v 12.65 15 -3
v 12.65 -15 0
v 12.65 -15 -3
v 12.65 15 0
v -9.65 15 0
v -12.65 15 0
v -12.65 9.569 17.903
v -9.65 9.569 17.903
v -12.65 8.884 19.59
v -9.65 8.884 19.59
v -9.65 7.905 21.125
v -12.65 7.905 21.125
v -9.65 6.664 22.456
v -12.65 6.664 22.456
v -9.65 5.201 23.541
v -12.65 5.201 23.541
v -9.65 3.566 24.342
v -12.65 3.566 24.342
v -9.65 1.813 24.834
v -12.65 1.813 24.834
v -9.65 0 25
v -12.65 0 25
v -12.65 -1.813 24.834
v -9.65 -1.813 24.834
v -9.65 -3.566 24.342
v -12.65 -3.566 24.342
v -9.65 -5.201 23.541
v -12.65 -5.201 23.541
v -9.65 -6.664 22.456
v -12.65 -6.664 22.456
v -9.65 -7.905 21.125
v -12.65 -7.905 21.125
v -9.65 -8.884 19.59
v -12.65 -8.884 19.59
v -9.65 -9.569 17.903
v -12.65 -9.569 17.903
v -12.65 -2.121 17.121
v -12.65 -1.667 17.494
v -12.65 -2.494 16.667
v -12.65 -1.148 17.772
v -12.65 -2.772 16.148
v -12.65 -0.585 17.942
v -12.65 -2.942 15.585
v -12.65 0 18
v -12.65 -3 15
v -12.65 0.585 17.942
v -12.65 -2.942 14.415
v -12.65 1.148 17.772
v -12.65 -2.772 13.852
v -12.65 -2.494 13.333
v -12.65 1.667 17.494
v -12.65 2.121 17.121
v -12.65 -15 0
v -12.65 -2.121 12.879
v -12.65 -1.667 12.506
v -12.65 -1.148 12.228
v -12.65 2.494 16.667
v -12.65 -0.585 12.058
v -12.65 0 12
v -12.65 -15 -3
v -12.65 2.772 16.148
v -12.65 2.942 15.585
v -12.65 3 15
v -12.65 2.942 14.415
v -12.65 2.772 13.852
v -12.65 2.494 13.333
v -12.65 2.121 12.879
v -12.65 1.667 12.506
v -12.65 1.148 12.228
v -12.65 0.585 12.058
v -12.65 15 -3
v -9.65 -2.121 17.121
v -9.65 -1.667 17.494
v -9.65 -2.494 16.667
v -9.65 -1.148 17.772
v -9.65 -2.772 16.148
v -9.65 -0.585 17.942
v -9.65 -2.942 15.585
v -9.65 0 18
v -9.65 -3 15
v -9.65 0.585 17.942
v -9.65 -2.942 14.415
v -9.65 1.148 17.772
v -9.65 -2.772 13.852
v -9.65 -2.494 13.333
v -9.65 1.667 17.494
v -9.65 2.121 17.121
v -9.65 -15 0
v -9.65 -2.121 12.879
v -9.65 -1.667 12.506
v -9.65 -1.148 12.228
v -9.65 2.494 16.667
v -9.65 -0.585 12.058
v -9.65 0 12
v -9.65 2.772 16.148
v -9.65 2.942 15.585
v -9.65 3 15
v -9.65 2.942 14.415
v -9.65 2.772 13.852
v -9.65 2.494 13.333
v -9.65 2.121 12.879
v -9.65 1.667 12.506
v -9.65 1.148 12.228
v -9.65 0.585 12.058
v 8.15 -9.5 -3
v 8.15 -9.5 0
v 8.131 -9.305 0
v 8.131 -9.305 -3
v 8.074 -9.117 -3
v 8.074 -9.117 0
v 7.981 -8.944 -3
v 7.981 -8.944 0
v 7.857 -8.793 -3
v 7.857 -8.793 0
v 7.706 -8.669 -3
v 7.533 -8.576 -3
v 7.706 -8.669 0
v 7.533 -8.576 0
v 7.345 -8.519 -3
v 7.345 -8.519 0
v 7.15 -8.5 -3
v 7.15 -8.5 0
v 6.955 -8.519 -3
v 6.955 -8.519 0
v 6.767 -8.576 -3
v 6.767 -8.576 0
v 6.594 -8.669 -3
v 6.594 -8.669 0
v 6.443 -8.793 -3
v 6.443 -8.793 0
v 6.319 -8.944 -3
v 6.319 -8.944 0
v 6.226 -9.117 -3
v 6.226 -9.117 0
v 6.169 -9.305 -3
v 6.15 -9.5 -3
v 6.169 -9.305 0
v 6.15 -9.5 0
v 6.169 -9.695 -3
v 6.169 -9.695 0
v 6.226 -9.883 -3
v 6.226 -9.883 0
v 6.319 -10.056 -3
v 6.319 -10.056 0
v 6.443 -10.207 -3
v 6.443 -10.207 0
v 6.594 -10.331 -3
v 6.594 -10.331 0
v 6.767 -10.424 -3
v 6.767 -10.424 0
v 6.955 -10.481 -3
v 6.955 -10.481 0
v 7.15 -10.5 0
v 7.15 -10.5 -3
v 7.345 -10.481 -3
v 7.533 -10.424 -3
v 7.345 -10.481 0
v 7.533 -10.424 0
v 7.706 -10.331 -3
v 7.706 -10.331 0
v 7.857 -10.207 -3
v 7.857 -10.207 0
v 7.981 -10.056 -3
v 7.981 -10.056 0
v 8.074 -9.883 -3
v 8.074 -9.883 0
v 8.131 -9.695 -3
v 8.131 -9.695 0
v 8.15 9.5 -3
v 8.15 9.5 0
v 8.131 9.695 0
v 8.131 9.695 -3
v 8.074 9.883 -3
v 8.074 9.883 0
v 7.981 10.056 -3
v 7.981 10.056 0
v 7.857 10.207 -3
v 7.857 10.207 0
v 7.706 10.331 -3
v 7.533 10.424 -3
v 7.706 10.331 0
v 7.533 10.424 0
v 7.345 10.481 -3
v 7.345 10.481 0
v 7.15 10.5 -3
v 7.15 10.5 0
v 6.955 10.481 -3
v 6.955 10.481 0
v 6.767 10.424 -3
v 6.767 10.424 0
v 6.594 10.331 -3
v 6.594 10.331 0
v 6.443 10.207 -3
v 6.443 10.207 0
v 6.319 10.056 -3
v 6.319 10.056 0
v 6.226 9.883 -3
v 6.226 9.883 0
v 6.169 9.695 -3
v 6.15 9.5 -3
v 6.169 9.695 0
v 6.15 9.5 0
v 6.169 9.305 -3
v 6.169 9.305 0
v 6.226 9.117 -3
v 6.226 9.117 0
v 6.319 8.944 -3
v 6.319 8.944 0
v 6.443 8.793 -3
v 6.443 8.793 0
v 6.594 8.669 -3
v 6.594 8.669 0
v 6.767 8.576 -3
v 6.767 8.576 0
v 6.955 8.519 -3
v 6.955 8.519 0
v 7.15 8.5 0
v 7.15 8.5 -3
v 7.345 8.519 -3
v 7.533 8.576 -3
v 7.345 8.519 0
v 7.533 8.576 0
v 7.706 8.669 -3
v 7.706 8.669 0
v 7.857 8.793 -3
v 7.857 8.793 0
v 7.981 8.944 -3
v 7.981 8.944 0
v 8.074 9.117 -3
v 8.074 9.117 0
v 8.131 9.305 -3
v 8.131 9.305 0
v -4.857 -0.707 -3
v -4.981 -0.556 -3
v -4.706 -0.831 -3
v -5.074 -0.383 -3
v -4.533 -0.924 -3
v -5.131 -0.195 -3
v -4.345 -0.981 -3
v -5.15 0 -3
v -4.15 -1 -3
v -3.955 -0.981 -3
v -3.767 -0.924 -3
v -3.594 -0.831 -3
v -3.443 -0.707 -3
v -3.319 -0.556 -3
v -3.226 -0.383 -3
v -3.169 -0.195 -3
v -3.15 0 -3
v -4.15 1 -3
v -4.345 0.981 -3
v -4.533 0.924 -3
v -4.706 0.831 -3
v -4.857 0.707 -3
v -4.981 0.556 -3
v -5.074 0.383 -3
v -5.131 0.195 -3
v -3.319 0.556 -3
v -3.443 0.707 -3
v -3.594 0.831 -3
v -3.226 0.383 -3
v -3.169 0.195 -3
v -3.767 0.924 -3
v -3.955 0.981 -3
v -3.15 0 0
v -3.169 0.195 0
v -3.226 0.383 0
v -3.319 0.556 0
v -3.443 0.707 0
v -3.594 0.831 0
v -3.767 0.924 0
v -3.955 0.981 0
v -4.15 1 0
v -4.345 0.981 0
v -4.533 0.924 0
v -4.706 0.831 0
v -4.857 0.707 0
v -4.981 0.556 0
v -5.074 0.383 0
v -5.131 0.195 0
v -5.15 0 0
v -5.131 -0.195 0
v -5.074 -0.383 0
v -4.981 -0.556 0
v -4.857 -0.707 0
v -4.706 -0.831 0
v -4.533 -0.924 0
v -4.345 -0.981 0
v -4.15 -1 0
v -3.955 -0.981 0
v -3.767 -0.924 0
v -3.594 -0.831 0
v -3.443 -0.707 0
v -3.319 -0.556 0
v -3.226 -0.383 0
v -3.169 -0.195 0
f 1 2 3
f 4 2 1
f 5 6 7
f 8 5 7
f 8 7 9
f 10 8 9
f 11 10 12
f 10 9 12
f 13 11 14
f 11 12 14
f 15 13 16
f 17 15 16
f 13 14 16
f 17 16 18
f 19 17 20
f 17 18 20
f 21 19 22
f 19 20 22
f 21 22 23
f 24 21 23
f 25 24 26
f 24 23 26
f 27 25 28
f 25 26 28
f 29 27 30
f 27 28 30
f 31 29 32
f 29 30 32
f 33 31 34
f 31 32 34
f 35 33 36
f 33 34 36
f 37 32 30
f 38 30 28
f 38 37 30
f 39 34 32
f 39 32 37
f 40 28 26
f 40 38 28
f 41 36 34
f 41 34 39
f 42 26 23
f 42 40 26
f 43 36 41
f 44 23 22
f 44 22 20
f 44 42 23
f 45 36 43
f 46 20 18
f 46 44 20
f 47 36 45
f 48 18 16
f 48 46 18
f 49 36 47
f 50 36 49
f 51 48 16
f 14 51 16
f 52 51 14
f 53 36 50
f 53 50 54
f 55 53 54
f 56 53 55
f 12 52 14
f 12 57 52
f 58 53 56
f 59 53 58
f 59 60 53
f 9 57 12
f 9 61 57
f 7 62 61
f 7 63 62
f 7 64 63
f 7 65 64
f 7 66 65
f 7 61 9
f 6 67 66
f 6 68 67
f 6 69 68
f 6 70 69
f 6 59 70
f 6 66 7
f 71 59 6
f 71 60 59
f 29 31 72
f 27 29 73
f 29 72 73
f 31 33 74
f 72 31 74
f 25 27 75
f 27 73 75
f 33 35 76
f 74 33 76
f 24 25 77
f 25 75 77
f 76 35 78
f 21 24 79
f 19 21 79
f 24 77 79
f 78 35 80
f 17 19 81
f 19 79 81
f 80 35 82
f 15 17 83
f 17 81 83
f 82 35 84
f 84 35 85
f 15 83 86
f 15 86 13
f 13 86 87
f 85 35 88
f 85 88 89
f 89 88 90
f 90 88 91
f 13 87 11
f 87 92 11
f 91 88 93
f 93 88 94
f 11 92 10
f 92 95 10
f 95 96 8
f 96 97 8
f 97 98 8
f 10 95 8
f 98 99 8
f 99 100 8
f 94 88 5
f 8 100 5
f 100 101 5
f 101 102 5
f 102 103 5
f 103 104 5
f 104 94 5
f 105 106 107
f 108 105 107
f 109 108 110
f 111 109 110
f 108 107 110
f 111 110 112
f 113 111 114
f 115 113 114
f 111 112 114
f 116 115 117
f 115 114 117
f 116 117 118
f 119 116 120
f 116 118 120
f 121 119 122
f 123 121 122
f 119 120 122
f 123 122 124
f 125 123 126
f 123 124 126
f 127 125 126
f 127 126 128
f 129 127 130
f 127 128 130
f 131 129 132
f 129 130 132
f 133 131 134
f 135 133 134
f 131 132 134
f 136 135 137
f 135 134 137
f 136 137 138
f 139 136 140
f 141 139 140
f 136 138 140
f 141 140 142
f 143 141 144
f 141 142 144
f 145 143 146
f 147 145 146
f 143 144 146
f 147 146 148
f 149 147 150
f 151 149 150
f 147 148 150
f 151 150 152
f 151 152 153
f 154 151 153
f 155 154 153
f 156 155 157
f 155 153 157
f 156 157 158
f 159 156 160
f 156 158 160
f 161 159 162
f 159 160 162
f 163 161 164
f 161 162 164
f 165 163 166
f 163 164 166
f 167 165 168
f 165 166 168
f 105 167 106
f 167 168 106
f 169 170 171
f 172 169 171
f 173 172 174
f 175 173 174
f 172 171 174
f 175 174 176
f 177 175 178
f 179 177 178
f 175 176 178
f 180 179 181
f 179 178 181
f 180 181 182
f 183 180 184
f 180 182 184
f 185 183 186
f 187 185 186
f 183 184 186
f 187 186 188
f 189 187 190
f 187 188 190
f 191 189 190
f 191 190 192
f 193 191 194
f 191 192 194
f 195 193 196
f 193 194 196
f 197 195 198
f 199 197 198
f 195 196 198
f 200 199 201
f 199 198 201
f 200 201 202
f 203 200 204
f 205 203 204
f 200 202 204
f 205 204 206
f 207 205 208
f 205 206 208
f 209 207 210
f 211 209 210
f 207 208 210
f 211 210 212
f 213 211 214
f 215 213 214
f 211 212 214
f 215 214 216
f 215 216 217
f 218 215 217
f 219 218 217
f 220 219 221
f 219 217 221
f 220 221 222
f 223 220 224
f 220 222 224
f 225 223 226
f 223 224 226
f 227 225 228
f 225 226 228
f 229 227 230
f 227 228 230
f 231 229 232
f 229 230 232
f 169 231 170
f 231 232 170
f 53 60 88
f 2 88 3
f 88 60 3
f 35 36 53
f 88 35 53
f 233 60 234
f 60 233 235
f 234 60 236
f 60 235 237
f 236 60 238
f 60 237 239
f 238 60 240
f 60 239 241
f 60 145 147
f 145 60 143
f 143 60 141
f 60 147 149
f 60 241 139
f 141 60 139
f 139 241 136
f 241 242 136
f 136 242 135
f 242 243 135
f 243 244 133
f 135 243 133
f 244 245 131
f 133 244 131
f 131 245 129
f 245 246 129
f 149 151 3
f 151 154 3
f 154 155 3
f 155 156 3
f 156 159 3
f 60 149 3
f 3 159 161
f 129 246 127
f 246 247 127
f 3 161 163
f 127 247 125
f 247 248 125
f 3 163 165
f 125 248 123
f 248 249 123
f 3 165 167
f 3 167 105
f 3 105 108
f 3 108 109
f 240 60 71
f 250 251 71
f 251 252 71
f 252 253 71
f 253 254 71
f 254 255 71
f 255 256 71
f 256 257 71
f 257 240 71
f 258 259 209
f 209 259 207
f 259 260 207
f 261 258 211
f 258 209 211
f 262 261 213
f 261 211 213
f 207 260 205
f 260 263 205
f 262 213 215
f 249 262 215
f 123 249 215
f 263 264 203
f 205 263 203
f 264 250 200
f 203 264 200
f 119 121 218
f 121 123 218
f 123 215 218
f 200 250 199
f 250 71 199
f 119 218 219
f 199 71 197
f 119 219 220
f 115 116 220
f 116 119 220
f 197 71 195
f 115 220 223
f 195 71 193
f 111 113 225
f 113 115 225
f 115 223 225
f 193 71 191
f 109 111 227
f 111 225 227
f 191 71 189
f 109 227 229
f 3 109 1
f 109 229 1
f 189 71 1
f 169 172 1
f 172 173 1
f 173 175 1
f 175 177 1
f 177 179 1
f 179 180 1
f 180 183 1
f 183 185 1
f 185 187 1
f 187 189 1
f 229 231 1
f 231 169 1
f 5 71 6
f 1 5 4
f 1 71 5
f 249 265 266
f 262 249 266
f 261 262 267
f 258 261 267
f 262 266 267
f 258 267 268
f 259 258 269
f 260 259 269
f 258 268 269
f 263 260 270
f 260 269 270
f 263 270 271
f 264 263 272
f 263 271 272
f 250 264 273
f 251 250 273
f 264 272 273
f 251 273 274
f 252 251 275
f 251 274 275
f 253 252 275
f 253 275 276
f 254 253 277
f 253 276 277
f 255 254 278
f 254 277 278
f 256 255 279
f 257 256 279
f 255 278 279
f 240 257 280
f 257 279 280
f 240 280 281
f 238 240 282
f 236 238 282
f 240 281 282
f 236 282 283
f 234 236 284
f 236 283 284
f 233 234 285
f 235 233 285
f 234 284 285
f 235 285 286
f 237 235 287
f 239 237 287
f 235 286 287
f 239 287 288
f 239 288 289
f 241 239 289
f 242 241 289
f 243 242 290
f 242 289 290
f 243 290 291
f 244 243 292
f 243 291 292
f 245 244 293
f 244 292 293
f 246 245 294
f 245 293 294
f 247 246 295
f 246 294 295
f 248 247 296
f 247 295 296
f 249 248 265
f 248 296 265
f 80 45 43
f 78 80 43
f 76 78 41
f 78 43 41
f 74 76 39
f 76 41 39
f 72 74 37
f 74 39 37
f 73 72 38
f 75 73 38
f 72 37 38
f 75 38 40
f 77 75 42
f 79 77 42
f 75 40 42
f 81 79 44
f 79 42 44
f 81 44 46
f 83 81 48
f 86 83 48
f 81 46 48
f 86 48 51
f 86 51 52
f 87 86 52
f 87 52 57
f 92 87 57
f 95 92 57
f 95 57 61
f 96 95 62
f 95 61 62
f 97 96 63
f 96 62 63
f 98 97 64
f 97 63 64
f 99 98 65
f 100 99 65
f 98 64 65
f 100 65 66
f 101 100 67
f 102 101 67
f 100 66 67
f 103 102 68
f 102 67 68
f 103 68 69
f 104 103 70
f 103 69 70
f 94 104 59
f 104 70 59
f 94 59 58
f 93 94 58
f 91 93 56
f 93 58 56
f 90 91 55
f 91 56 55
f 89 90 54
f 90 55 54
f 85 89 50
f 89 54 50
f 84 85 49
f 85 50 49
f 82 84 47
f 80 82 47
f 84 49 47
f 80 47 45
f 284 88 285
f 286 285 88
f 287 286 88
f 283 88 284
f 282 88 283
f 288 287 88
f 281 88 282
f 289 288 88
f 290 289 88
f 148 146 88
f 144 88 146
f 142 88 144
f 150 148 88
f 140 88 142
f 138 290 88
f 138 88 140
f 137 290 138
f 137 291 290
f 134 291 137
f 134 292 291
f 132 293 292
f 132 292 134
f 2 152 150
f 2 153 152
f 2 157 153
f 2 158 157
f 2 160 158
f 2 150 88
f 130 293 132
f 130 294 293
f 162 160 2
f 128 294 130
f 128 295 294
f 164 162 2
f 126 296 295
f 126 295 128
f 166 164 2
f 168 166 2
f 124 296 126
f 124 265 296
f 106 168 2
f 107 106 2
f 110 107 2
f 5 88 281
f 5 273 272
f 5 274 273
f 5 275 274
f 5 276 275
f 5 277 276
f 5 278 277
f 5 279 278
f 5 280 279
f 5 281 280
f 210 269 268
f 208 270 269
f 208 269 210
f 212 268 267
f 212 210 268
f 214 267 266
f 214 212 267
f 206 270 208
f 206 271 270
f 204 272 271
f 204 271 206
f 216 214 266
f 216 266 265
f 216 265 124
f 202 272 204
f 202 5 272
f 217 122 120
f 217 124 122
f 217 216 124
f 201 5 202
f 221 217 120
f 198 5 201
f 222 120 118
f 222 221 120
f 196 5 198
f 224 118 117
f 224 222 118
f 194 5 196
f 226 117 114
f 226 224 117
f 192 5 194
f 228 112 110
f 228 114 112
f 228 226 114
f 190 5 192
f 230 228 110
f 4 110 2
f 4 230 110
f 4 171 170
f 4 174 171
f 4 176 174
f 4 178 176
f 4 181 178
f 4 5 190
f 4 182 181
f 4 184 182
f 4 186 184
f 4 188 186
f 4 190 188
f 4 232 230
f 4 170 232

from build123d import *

# Parameters (mm, degrees)
F0_W     = 25.3
F0_H     = 30
F1_DEPTH = 3
F2_W     = 3
F2_H     = 30
F3_DEPTH = 25
F5_DEPTH = 3
F6_R     = 1
F7_DEPTH = 3


# Not quite as in the source:
# - a feature names something its author has since deleted; it is built from what else it names


with BuildPart() as f1:
    # F0 (on Top) → F1 (new body)
    with BuildSketch(Plane.XY):
        Rectangle(F0_W, F0_H)
    extrude(amount=-F1_DEPTH)

    # F2 (on face) → F3 (join)
    with BuildSketch(Plane.XY):
        with Locations((-11.15, 0)):
            Rectangle(F2_W, F2_H)
    extrude(amount=F3_DEPTH)

    # F4 (on face) → F5 (cut)
    with BuildSketch(Plane(origin=(-12.65, 0, 0), x_dir=(0, -1, 0), z_dir=(-1, 0, 0))):
        with BuildLine():
            ThreePointArc((3, 15), (-2.1213203436, 17.1213203436), (0, 12))
            ThreePointArc((0, 12), (2.1213203436, 12.8786796564), (3, 15))
        make_face()
        with BuildLine():
            Line((-15, 25), (-15, 0))
            Line((-15, 0), (-9.569428978, 17.9027623113))
            ThreePointArc((-9.569428978, 17.9027623113), (-5.9570284911, 23.032049026), (0, 25))
            Line((0, 25), (-15, 25))
        make_face()
        with BuildLine():
            Line((9.569428978, 17.9027623113), (15, 0))
            Line((15, 0), (15, 25))
            Line((15, 25), (0, 25))
            ThreePointArc((0, 25), (5.9570284911, 23.032049026), (9.569428978, 17.9027623113))
        make_face()
    extrude(amount=-F5_DEPTH, mode=Mode.SUBTRACT)

    # F6 (on face) → F7 (cut)
    with BuildSketch(Plane.XY):
        with Locations((7.15, -9.5)):
            Circle(F6_R)
        with Locations((-4.15, 0)):
            Circle(F6_R)
        with Locations((7.15, 9.5)):
            Circle(F6_R)
    extrude(amount=-F7_DEPTH, mode=Mode.SUBTRACT)


solid = f1.part
